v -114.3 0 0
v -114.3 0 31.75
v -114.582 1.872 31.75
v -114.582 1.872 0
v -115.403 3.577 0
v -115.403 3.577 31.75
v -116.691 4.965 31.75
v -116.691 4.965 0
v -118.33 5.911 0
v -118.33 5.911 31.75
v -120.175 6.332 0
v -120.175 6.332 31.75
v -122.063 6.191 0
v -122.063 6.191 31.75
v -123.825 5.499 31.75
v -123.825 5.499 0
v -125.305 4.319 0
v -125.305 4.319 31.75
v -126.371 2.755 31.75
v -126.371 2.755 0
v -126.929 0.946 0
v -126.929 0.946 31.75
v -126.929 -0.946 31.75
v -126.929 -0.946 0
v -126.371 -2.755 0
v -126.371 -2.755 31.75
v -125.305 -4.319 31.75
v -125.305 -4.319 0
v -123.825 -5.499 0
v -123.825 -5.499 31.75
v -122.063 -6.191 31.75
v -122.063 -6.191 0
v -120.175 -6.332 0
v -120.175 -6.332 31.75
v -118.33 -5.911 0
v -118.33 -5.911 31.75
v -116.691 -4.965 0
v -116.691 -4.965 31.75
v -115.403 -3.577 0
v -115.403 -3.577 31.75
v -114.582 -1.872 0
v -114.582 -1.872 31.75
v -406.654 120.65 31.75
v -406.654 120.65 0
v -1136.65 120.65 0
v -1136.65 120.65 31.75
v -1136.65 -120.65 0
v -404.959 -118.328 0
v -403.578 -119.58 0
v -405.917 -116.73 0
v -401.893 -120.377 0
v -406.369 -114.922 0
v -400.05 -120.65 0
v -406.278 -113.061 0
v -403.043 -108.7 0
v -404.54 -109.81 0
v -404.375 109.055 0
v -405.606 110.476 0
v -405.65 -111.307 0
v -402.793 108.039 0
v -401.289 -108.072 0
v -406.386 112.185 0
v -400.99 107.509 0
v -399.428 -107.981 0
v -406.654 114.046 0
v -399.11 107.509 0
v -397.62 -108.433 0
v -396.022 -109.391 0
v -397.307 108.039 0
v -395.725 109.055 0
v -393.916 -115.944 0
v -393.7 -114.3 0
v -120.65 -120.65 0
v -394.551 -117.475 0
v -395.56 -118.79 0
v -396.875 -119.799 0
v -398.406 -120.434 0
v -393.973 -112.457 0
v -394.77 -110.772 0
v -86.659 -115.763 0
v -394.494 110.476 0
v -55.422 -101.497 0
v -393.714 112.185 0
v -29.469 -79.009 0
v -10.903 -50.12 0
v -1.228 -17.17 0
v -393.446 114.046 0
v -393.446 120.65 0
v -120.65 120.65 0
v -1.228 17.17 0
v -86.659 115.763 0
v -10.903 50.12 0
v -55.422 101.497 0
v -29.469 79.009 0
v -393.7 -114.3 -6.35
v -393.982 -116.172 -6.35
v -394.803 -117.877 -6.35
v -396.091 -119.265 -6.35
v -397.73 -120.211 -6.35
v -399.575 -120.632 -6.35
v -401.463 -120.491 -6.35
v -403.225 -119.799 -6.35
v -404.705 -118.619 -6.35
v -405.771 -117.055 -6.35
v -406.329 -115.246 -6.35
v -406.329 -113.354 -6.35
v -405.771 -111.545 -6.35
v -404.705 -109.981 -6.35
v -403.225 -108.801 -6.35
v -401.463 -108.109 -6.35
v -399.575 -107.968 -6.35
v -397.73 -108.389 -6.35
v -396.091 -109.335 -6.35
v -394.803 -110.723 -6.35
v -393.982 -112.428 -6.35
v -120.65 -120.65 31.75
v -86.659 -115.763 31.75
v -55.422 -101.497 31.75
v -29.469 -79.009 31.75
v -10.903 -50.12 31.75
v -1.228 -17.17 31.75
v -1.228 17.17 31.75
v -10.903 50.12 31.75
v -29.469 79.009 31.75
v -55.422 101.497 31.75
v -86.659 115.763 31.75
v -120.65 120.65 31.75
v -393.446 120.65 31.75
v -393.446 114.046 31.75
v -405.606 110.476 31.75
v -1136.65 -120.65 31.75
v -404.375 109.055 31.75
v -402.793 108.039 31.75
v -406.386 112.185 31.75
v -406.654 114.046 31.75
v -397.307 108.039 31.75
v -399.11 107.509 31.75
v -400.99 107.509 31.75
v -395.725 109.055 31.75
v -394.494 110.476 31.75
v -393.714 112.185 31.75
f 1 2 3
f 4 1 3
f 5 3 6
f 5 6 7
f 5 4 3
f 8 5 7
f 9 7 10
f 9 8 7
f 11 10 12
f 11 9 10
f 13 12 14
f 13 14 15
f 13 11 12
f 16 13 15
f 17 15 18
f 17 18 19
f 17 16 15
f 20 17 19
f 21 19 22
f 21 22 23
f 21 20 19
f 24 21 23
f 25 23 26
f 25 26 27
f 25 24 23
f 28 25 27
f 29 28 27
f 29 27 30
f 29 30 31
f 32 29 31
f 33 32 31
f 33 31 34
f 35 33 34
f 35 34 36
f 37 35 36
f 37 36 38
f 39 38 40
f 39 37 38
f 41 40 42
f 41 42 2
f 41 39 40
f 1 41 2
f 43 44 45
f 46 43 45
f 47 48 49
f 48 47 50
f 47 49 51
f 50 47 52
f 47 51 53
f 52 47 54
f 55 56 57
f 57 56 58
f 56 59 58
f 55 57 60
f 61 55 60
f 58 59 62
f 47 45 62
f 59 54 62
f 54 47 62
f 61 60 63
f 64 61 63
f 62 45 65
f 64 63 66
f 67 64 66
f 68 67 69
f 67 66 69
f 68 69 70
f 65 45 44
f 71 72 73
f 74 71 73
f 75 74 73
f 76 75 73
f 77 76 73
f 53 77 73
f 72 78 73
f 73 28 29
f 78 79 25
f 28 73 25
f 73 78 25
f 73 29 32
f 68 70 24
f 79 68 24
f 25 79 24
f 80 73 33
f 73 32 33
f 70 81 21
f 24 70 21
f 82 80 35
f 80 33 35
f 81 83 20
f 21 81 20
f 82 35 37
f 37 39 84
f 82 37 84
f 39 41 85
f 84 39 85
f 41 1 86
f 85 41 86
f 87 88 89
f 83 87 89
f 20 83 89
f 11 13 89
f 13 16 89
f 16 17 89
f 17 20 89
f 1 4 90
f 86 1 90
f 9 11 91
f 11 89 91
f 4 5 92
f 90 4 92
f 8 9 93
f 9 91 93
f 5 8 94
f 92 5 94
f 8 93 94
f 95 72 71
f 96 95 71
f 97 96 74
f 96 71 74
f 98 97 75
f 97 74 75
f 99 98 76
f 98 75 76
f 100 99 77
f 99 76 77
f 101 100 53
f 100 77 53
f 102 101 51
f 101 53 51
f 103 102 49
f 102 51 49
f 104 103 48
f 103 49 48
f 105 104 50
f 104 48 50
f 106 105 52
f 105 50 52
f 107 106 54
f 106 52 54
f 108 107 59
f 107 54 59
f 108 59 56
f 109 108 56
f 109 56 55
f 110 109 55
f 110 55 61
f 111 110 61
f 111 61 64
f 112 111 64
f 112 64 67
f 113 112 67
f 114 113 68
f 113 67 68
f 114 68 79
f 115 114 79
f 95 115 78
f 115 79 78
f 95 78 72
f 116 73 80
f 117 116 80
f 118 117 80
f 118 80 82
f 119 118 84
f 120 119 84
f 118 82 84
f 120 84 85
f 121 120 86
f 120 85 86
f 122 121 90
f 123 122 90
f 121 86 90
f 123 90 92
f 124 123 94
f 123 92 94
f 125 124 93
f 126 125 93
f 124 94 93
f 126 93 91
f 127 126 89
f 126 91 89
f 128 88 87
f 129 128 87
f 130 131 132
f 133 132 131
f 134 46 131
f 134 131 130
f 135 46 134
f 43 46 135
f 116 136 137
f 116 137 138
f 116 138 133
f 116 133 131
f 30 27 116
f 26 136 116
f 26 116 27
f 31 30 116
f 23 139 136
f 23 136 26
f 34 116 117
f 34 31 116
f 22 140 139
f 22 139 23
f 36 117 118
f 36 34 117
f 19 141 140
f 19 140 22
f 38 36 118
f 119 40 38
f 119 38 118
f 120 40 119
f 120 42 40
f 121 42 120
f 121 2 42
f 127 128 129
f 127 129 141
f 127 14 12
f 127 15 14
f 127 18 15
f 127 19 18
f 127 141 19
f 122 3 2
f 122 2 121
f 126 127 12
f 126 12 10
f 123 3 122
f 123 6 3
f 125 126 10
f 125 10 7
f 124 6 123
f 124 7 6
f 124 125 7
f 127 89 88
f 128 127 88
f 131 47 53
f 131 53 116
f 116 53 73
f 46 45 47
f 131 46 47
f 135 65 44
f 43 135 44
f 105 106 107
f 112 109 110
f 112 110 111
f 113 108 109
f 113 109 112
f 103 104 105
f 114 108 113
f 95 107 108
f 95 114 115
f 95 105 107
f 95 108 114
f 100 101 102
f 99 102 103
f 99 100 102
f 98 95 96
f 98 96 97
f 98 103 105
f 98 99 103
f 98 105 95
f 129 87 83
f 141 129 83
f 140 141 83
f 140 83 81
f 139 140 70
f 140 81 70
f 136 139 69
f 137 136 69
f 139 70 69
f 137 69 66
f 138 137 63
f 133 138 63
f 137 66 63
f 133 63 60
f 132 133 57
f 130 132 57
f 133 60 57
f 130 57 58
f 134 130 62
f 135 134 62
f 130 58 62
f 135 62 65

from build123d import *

# Parameters (mm, degrees)
F0_R     = 6.35
F1_DEPTH = 31.75
F2_R     = 6.35
F3_DEPTH = 6.35
F5_DEPTH = 31.75


with BuildPart() as f1:
    # F0 (on Top) → F1 (new body)
    with BuildSketch(Plane.XY):
        with BuildLine():
            Line((-1136.65, 120.65), (-1136.65, -120.65))
            Line((-1136.65, -120.65), (-120.65, -120.65))
            ThreePointArc((-120.65, -120.65), (0, 0), (-120.65, 120.65))
            Line((-120.65, 120.65), (-1136.65, 120.65))
        make_face()
        with Locations((-120.65, 0)):
            Circle(F0_R, mode=Mode.SUBTRACT)
    extrude(amount=F1_DEPTH)

    # F2 (on face) → F3 (join)
    with BuildSketch(Plane(origin=(0, 0, 0), x_dir=(1, 0, 0), z_dir=(0, 0, -1))):
        with Locations((-400.05, 114.3)):
            Circle(F2_R)
    extrude(amount=F3_DEPTH)

    # F4 (on face) → F5 (cut)
    with BuildSketch(Plane(origin=(0, 0, 0), x_dir=(1, 0, 0), z_dir=(0, 0, -1))):
        with BuildLine():
            Line((-393.446, -120.65), (-393.446, -114.046))
            ThreePointArc((-393.446, -114.046), (-400.05, -107.442), (-406.654, -114.046))
            Line((-406.654, -114.046), (-406.654, -120.65))
            Line((-406.654, -120.65), (-393.446, -120.65))
        make_face()
    extrude(amount=-F5_DEPTH, mode=Mode.SUBTRACT)


solid = f1.part
